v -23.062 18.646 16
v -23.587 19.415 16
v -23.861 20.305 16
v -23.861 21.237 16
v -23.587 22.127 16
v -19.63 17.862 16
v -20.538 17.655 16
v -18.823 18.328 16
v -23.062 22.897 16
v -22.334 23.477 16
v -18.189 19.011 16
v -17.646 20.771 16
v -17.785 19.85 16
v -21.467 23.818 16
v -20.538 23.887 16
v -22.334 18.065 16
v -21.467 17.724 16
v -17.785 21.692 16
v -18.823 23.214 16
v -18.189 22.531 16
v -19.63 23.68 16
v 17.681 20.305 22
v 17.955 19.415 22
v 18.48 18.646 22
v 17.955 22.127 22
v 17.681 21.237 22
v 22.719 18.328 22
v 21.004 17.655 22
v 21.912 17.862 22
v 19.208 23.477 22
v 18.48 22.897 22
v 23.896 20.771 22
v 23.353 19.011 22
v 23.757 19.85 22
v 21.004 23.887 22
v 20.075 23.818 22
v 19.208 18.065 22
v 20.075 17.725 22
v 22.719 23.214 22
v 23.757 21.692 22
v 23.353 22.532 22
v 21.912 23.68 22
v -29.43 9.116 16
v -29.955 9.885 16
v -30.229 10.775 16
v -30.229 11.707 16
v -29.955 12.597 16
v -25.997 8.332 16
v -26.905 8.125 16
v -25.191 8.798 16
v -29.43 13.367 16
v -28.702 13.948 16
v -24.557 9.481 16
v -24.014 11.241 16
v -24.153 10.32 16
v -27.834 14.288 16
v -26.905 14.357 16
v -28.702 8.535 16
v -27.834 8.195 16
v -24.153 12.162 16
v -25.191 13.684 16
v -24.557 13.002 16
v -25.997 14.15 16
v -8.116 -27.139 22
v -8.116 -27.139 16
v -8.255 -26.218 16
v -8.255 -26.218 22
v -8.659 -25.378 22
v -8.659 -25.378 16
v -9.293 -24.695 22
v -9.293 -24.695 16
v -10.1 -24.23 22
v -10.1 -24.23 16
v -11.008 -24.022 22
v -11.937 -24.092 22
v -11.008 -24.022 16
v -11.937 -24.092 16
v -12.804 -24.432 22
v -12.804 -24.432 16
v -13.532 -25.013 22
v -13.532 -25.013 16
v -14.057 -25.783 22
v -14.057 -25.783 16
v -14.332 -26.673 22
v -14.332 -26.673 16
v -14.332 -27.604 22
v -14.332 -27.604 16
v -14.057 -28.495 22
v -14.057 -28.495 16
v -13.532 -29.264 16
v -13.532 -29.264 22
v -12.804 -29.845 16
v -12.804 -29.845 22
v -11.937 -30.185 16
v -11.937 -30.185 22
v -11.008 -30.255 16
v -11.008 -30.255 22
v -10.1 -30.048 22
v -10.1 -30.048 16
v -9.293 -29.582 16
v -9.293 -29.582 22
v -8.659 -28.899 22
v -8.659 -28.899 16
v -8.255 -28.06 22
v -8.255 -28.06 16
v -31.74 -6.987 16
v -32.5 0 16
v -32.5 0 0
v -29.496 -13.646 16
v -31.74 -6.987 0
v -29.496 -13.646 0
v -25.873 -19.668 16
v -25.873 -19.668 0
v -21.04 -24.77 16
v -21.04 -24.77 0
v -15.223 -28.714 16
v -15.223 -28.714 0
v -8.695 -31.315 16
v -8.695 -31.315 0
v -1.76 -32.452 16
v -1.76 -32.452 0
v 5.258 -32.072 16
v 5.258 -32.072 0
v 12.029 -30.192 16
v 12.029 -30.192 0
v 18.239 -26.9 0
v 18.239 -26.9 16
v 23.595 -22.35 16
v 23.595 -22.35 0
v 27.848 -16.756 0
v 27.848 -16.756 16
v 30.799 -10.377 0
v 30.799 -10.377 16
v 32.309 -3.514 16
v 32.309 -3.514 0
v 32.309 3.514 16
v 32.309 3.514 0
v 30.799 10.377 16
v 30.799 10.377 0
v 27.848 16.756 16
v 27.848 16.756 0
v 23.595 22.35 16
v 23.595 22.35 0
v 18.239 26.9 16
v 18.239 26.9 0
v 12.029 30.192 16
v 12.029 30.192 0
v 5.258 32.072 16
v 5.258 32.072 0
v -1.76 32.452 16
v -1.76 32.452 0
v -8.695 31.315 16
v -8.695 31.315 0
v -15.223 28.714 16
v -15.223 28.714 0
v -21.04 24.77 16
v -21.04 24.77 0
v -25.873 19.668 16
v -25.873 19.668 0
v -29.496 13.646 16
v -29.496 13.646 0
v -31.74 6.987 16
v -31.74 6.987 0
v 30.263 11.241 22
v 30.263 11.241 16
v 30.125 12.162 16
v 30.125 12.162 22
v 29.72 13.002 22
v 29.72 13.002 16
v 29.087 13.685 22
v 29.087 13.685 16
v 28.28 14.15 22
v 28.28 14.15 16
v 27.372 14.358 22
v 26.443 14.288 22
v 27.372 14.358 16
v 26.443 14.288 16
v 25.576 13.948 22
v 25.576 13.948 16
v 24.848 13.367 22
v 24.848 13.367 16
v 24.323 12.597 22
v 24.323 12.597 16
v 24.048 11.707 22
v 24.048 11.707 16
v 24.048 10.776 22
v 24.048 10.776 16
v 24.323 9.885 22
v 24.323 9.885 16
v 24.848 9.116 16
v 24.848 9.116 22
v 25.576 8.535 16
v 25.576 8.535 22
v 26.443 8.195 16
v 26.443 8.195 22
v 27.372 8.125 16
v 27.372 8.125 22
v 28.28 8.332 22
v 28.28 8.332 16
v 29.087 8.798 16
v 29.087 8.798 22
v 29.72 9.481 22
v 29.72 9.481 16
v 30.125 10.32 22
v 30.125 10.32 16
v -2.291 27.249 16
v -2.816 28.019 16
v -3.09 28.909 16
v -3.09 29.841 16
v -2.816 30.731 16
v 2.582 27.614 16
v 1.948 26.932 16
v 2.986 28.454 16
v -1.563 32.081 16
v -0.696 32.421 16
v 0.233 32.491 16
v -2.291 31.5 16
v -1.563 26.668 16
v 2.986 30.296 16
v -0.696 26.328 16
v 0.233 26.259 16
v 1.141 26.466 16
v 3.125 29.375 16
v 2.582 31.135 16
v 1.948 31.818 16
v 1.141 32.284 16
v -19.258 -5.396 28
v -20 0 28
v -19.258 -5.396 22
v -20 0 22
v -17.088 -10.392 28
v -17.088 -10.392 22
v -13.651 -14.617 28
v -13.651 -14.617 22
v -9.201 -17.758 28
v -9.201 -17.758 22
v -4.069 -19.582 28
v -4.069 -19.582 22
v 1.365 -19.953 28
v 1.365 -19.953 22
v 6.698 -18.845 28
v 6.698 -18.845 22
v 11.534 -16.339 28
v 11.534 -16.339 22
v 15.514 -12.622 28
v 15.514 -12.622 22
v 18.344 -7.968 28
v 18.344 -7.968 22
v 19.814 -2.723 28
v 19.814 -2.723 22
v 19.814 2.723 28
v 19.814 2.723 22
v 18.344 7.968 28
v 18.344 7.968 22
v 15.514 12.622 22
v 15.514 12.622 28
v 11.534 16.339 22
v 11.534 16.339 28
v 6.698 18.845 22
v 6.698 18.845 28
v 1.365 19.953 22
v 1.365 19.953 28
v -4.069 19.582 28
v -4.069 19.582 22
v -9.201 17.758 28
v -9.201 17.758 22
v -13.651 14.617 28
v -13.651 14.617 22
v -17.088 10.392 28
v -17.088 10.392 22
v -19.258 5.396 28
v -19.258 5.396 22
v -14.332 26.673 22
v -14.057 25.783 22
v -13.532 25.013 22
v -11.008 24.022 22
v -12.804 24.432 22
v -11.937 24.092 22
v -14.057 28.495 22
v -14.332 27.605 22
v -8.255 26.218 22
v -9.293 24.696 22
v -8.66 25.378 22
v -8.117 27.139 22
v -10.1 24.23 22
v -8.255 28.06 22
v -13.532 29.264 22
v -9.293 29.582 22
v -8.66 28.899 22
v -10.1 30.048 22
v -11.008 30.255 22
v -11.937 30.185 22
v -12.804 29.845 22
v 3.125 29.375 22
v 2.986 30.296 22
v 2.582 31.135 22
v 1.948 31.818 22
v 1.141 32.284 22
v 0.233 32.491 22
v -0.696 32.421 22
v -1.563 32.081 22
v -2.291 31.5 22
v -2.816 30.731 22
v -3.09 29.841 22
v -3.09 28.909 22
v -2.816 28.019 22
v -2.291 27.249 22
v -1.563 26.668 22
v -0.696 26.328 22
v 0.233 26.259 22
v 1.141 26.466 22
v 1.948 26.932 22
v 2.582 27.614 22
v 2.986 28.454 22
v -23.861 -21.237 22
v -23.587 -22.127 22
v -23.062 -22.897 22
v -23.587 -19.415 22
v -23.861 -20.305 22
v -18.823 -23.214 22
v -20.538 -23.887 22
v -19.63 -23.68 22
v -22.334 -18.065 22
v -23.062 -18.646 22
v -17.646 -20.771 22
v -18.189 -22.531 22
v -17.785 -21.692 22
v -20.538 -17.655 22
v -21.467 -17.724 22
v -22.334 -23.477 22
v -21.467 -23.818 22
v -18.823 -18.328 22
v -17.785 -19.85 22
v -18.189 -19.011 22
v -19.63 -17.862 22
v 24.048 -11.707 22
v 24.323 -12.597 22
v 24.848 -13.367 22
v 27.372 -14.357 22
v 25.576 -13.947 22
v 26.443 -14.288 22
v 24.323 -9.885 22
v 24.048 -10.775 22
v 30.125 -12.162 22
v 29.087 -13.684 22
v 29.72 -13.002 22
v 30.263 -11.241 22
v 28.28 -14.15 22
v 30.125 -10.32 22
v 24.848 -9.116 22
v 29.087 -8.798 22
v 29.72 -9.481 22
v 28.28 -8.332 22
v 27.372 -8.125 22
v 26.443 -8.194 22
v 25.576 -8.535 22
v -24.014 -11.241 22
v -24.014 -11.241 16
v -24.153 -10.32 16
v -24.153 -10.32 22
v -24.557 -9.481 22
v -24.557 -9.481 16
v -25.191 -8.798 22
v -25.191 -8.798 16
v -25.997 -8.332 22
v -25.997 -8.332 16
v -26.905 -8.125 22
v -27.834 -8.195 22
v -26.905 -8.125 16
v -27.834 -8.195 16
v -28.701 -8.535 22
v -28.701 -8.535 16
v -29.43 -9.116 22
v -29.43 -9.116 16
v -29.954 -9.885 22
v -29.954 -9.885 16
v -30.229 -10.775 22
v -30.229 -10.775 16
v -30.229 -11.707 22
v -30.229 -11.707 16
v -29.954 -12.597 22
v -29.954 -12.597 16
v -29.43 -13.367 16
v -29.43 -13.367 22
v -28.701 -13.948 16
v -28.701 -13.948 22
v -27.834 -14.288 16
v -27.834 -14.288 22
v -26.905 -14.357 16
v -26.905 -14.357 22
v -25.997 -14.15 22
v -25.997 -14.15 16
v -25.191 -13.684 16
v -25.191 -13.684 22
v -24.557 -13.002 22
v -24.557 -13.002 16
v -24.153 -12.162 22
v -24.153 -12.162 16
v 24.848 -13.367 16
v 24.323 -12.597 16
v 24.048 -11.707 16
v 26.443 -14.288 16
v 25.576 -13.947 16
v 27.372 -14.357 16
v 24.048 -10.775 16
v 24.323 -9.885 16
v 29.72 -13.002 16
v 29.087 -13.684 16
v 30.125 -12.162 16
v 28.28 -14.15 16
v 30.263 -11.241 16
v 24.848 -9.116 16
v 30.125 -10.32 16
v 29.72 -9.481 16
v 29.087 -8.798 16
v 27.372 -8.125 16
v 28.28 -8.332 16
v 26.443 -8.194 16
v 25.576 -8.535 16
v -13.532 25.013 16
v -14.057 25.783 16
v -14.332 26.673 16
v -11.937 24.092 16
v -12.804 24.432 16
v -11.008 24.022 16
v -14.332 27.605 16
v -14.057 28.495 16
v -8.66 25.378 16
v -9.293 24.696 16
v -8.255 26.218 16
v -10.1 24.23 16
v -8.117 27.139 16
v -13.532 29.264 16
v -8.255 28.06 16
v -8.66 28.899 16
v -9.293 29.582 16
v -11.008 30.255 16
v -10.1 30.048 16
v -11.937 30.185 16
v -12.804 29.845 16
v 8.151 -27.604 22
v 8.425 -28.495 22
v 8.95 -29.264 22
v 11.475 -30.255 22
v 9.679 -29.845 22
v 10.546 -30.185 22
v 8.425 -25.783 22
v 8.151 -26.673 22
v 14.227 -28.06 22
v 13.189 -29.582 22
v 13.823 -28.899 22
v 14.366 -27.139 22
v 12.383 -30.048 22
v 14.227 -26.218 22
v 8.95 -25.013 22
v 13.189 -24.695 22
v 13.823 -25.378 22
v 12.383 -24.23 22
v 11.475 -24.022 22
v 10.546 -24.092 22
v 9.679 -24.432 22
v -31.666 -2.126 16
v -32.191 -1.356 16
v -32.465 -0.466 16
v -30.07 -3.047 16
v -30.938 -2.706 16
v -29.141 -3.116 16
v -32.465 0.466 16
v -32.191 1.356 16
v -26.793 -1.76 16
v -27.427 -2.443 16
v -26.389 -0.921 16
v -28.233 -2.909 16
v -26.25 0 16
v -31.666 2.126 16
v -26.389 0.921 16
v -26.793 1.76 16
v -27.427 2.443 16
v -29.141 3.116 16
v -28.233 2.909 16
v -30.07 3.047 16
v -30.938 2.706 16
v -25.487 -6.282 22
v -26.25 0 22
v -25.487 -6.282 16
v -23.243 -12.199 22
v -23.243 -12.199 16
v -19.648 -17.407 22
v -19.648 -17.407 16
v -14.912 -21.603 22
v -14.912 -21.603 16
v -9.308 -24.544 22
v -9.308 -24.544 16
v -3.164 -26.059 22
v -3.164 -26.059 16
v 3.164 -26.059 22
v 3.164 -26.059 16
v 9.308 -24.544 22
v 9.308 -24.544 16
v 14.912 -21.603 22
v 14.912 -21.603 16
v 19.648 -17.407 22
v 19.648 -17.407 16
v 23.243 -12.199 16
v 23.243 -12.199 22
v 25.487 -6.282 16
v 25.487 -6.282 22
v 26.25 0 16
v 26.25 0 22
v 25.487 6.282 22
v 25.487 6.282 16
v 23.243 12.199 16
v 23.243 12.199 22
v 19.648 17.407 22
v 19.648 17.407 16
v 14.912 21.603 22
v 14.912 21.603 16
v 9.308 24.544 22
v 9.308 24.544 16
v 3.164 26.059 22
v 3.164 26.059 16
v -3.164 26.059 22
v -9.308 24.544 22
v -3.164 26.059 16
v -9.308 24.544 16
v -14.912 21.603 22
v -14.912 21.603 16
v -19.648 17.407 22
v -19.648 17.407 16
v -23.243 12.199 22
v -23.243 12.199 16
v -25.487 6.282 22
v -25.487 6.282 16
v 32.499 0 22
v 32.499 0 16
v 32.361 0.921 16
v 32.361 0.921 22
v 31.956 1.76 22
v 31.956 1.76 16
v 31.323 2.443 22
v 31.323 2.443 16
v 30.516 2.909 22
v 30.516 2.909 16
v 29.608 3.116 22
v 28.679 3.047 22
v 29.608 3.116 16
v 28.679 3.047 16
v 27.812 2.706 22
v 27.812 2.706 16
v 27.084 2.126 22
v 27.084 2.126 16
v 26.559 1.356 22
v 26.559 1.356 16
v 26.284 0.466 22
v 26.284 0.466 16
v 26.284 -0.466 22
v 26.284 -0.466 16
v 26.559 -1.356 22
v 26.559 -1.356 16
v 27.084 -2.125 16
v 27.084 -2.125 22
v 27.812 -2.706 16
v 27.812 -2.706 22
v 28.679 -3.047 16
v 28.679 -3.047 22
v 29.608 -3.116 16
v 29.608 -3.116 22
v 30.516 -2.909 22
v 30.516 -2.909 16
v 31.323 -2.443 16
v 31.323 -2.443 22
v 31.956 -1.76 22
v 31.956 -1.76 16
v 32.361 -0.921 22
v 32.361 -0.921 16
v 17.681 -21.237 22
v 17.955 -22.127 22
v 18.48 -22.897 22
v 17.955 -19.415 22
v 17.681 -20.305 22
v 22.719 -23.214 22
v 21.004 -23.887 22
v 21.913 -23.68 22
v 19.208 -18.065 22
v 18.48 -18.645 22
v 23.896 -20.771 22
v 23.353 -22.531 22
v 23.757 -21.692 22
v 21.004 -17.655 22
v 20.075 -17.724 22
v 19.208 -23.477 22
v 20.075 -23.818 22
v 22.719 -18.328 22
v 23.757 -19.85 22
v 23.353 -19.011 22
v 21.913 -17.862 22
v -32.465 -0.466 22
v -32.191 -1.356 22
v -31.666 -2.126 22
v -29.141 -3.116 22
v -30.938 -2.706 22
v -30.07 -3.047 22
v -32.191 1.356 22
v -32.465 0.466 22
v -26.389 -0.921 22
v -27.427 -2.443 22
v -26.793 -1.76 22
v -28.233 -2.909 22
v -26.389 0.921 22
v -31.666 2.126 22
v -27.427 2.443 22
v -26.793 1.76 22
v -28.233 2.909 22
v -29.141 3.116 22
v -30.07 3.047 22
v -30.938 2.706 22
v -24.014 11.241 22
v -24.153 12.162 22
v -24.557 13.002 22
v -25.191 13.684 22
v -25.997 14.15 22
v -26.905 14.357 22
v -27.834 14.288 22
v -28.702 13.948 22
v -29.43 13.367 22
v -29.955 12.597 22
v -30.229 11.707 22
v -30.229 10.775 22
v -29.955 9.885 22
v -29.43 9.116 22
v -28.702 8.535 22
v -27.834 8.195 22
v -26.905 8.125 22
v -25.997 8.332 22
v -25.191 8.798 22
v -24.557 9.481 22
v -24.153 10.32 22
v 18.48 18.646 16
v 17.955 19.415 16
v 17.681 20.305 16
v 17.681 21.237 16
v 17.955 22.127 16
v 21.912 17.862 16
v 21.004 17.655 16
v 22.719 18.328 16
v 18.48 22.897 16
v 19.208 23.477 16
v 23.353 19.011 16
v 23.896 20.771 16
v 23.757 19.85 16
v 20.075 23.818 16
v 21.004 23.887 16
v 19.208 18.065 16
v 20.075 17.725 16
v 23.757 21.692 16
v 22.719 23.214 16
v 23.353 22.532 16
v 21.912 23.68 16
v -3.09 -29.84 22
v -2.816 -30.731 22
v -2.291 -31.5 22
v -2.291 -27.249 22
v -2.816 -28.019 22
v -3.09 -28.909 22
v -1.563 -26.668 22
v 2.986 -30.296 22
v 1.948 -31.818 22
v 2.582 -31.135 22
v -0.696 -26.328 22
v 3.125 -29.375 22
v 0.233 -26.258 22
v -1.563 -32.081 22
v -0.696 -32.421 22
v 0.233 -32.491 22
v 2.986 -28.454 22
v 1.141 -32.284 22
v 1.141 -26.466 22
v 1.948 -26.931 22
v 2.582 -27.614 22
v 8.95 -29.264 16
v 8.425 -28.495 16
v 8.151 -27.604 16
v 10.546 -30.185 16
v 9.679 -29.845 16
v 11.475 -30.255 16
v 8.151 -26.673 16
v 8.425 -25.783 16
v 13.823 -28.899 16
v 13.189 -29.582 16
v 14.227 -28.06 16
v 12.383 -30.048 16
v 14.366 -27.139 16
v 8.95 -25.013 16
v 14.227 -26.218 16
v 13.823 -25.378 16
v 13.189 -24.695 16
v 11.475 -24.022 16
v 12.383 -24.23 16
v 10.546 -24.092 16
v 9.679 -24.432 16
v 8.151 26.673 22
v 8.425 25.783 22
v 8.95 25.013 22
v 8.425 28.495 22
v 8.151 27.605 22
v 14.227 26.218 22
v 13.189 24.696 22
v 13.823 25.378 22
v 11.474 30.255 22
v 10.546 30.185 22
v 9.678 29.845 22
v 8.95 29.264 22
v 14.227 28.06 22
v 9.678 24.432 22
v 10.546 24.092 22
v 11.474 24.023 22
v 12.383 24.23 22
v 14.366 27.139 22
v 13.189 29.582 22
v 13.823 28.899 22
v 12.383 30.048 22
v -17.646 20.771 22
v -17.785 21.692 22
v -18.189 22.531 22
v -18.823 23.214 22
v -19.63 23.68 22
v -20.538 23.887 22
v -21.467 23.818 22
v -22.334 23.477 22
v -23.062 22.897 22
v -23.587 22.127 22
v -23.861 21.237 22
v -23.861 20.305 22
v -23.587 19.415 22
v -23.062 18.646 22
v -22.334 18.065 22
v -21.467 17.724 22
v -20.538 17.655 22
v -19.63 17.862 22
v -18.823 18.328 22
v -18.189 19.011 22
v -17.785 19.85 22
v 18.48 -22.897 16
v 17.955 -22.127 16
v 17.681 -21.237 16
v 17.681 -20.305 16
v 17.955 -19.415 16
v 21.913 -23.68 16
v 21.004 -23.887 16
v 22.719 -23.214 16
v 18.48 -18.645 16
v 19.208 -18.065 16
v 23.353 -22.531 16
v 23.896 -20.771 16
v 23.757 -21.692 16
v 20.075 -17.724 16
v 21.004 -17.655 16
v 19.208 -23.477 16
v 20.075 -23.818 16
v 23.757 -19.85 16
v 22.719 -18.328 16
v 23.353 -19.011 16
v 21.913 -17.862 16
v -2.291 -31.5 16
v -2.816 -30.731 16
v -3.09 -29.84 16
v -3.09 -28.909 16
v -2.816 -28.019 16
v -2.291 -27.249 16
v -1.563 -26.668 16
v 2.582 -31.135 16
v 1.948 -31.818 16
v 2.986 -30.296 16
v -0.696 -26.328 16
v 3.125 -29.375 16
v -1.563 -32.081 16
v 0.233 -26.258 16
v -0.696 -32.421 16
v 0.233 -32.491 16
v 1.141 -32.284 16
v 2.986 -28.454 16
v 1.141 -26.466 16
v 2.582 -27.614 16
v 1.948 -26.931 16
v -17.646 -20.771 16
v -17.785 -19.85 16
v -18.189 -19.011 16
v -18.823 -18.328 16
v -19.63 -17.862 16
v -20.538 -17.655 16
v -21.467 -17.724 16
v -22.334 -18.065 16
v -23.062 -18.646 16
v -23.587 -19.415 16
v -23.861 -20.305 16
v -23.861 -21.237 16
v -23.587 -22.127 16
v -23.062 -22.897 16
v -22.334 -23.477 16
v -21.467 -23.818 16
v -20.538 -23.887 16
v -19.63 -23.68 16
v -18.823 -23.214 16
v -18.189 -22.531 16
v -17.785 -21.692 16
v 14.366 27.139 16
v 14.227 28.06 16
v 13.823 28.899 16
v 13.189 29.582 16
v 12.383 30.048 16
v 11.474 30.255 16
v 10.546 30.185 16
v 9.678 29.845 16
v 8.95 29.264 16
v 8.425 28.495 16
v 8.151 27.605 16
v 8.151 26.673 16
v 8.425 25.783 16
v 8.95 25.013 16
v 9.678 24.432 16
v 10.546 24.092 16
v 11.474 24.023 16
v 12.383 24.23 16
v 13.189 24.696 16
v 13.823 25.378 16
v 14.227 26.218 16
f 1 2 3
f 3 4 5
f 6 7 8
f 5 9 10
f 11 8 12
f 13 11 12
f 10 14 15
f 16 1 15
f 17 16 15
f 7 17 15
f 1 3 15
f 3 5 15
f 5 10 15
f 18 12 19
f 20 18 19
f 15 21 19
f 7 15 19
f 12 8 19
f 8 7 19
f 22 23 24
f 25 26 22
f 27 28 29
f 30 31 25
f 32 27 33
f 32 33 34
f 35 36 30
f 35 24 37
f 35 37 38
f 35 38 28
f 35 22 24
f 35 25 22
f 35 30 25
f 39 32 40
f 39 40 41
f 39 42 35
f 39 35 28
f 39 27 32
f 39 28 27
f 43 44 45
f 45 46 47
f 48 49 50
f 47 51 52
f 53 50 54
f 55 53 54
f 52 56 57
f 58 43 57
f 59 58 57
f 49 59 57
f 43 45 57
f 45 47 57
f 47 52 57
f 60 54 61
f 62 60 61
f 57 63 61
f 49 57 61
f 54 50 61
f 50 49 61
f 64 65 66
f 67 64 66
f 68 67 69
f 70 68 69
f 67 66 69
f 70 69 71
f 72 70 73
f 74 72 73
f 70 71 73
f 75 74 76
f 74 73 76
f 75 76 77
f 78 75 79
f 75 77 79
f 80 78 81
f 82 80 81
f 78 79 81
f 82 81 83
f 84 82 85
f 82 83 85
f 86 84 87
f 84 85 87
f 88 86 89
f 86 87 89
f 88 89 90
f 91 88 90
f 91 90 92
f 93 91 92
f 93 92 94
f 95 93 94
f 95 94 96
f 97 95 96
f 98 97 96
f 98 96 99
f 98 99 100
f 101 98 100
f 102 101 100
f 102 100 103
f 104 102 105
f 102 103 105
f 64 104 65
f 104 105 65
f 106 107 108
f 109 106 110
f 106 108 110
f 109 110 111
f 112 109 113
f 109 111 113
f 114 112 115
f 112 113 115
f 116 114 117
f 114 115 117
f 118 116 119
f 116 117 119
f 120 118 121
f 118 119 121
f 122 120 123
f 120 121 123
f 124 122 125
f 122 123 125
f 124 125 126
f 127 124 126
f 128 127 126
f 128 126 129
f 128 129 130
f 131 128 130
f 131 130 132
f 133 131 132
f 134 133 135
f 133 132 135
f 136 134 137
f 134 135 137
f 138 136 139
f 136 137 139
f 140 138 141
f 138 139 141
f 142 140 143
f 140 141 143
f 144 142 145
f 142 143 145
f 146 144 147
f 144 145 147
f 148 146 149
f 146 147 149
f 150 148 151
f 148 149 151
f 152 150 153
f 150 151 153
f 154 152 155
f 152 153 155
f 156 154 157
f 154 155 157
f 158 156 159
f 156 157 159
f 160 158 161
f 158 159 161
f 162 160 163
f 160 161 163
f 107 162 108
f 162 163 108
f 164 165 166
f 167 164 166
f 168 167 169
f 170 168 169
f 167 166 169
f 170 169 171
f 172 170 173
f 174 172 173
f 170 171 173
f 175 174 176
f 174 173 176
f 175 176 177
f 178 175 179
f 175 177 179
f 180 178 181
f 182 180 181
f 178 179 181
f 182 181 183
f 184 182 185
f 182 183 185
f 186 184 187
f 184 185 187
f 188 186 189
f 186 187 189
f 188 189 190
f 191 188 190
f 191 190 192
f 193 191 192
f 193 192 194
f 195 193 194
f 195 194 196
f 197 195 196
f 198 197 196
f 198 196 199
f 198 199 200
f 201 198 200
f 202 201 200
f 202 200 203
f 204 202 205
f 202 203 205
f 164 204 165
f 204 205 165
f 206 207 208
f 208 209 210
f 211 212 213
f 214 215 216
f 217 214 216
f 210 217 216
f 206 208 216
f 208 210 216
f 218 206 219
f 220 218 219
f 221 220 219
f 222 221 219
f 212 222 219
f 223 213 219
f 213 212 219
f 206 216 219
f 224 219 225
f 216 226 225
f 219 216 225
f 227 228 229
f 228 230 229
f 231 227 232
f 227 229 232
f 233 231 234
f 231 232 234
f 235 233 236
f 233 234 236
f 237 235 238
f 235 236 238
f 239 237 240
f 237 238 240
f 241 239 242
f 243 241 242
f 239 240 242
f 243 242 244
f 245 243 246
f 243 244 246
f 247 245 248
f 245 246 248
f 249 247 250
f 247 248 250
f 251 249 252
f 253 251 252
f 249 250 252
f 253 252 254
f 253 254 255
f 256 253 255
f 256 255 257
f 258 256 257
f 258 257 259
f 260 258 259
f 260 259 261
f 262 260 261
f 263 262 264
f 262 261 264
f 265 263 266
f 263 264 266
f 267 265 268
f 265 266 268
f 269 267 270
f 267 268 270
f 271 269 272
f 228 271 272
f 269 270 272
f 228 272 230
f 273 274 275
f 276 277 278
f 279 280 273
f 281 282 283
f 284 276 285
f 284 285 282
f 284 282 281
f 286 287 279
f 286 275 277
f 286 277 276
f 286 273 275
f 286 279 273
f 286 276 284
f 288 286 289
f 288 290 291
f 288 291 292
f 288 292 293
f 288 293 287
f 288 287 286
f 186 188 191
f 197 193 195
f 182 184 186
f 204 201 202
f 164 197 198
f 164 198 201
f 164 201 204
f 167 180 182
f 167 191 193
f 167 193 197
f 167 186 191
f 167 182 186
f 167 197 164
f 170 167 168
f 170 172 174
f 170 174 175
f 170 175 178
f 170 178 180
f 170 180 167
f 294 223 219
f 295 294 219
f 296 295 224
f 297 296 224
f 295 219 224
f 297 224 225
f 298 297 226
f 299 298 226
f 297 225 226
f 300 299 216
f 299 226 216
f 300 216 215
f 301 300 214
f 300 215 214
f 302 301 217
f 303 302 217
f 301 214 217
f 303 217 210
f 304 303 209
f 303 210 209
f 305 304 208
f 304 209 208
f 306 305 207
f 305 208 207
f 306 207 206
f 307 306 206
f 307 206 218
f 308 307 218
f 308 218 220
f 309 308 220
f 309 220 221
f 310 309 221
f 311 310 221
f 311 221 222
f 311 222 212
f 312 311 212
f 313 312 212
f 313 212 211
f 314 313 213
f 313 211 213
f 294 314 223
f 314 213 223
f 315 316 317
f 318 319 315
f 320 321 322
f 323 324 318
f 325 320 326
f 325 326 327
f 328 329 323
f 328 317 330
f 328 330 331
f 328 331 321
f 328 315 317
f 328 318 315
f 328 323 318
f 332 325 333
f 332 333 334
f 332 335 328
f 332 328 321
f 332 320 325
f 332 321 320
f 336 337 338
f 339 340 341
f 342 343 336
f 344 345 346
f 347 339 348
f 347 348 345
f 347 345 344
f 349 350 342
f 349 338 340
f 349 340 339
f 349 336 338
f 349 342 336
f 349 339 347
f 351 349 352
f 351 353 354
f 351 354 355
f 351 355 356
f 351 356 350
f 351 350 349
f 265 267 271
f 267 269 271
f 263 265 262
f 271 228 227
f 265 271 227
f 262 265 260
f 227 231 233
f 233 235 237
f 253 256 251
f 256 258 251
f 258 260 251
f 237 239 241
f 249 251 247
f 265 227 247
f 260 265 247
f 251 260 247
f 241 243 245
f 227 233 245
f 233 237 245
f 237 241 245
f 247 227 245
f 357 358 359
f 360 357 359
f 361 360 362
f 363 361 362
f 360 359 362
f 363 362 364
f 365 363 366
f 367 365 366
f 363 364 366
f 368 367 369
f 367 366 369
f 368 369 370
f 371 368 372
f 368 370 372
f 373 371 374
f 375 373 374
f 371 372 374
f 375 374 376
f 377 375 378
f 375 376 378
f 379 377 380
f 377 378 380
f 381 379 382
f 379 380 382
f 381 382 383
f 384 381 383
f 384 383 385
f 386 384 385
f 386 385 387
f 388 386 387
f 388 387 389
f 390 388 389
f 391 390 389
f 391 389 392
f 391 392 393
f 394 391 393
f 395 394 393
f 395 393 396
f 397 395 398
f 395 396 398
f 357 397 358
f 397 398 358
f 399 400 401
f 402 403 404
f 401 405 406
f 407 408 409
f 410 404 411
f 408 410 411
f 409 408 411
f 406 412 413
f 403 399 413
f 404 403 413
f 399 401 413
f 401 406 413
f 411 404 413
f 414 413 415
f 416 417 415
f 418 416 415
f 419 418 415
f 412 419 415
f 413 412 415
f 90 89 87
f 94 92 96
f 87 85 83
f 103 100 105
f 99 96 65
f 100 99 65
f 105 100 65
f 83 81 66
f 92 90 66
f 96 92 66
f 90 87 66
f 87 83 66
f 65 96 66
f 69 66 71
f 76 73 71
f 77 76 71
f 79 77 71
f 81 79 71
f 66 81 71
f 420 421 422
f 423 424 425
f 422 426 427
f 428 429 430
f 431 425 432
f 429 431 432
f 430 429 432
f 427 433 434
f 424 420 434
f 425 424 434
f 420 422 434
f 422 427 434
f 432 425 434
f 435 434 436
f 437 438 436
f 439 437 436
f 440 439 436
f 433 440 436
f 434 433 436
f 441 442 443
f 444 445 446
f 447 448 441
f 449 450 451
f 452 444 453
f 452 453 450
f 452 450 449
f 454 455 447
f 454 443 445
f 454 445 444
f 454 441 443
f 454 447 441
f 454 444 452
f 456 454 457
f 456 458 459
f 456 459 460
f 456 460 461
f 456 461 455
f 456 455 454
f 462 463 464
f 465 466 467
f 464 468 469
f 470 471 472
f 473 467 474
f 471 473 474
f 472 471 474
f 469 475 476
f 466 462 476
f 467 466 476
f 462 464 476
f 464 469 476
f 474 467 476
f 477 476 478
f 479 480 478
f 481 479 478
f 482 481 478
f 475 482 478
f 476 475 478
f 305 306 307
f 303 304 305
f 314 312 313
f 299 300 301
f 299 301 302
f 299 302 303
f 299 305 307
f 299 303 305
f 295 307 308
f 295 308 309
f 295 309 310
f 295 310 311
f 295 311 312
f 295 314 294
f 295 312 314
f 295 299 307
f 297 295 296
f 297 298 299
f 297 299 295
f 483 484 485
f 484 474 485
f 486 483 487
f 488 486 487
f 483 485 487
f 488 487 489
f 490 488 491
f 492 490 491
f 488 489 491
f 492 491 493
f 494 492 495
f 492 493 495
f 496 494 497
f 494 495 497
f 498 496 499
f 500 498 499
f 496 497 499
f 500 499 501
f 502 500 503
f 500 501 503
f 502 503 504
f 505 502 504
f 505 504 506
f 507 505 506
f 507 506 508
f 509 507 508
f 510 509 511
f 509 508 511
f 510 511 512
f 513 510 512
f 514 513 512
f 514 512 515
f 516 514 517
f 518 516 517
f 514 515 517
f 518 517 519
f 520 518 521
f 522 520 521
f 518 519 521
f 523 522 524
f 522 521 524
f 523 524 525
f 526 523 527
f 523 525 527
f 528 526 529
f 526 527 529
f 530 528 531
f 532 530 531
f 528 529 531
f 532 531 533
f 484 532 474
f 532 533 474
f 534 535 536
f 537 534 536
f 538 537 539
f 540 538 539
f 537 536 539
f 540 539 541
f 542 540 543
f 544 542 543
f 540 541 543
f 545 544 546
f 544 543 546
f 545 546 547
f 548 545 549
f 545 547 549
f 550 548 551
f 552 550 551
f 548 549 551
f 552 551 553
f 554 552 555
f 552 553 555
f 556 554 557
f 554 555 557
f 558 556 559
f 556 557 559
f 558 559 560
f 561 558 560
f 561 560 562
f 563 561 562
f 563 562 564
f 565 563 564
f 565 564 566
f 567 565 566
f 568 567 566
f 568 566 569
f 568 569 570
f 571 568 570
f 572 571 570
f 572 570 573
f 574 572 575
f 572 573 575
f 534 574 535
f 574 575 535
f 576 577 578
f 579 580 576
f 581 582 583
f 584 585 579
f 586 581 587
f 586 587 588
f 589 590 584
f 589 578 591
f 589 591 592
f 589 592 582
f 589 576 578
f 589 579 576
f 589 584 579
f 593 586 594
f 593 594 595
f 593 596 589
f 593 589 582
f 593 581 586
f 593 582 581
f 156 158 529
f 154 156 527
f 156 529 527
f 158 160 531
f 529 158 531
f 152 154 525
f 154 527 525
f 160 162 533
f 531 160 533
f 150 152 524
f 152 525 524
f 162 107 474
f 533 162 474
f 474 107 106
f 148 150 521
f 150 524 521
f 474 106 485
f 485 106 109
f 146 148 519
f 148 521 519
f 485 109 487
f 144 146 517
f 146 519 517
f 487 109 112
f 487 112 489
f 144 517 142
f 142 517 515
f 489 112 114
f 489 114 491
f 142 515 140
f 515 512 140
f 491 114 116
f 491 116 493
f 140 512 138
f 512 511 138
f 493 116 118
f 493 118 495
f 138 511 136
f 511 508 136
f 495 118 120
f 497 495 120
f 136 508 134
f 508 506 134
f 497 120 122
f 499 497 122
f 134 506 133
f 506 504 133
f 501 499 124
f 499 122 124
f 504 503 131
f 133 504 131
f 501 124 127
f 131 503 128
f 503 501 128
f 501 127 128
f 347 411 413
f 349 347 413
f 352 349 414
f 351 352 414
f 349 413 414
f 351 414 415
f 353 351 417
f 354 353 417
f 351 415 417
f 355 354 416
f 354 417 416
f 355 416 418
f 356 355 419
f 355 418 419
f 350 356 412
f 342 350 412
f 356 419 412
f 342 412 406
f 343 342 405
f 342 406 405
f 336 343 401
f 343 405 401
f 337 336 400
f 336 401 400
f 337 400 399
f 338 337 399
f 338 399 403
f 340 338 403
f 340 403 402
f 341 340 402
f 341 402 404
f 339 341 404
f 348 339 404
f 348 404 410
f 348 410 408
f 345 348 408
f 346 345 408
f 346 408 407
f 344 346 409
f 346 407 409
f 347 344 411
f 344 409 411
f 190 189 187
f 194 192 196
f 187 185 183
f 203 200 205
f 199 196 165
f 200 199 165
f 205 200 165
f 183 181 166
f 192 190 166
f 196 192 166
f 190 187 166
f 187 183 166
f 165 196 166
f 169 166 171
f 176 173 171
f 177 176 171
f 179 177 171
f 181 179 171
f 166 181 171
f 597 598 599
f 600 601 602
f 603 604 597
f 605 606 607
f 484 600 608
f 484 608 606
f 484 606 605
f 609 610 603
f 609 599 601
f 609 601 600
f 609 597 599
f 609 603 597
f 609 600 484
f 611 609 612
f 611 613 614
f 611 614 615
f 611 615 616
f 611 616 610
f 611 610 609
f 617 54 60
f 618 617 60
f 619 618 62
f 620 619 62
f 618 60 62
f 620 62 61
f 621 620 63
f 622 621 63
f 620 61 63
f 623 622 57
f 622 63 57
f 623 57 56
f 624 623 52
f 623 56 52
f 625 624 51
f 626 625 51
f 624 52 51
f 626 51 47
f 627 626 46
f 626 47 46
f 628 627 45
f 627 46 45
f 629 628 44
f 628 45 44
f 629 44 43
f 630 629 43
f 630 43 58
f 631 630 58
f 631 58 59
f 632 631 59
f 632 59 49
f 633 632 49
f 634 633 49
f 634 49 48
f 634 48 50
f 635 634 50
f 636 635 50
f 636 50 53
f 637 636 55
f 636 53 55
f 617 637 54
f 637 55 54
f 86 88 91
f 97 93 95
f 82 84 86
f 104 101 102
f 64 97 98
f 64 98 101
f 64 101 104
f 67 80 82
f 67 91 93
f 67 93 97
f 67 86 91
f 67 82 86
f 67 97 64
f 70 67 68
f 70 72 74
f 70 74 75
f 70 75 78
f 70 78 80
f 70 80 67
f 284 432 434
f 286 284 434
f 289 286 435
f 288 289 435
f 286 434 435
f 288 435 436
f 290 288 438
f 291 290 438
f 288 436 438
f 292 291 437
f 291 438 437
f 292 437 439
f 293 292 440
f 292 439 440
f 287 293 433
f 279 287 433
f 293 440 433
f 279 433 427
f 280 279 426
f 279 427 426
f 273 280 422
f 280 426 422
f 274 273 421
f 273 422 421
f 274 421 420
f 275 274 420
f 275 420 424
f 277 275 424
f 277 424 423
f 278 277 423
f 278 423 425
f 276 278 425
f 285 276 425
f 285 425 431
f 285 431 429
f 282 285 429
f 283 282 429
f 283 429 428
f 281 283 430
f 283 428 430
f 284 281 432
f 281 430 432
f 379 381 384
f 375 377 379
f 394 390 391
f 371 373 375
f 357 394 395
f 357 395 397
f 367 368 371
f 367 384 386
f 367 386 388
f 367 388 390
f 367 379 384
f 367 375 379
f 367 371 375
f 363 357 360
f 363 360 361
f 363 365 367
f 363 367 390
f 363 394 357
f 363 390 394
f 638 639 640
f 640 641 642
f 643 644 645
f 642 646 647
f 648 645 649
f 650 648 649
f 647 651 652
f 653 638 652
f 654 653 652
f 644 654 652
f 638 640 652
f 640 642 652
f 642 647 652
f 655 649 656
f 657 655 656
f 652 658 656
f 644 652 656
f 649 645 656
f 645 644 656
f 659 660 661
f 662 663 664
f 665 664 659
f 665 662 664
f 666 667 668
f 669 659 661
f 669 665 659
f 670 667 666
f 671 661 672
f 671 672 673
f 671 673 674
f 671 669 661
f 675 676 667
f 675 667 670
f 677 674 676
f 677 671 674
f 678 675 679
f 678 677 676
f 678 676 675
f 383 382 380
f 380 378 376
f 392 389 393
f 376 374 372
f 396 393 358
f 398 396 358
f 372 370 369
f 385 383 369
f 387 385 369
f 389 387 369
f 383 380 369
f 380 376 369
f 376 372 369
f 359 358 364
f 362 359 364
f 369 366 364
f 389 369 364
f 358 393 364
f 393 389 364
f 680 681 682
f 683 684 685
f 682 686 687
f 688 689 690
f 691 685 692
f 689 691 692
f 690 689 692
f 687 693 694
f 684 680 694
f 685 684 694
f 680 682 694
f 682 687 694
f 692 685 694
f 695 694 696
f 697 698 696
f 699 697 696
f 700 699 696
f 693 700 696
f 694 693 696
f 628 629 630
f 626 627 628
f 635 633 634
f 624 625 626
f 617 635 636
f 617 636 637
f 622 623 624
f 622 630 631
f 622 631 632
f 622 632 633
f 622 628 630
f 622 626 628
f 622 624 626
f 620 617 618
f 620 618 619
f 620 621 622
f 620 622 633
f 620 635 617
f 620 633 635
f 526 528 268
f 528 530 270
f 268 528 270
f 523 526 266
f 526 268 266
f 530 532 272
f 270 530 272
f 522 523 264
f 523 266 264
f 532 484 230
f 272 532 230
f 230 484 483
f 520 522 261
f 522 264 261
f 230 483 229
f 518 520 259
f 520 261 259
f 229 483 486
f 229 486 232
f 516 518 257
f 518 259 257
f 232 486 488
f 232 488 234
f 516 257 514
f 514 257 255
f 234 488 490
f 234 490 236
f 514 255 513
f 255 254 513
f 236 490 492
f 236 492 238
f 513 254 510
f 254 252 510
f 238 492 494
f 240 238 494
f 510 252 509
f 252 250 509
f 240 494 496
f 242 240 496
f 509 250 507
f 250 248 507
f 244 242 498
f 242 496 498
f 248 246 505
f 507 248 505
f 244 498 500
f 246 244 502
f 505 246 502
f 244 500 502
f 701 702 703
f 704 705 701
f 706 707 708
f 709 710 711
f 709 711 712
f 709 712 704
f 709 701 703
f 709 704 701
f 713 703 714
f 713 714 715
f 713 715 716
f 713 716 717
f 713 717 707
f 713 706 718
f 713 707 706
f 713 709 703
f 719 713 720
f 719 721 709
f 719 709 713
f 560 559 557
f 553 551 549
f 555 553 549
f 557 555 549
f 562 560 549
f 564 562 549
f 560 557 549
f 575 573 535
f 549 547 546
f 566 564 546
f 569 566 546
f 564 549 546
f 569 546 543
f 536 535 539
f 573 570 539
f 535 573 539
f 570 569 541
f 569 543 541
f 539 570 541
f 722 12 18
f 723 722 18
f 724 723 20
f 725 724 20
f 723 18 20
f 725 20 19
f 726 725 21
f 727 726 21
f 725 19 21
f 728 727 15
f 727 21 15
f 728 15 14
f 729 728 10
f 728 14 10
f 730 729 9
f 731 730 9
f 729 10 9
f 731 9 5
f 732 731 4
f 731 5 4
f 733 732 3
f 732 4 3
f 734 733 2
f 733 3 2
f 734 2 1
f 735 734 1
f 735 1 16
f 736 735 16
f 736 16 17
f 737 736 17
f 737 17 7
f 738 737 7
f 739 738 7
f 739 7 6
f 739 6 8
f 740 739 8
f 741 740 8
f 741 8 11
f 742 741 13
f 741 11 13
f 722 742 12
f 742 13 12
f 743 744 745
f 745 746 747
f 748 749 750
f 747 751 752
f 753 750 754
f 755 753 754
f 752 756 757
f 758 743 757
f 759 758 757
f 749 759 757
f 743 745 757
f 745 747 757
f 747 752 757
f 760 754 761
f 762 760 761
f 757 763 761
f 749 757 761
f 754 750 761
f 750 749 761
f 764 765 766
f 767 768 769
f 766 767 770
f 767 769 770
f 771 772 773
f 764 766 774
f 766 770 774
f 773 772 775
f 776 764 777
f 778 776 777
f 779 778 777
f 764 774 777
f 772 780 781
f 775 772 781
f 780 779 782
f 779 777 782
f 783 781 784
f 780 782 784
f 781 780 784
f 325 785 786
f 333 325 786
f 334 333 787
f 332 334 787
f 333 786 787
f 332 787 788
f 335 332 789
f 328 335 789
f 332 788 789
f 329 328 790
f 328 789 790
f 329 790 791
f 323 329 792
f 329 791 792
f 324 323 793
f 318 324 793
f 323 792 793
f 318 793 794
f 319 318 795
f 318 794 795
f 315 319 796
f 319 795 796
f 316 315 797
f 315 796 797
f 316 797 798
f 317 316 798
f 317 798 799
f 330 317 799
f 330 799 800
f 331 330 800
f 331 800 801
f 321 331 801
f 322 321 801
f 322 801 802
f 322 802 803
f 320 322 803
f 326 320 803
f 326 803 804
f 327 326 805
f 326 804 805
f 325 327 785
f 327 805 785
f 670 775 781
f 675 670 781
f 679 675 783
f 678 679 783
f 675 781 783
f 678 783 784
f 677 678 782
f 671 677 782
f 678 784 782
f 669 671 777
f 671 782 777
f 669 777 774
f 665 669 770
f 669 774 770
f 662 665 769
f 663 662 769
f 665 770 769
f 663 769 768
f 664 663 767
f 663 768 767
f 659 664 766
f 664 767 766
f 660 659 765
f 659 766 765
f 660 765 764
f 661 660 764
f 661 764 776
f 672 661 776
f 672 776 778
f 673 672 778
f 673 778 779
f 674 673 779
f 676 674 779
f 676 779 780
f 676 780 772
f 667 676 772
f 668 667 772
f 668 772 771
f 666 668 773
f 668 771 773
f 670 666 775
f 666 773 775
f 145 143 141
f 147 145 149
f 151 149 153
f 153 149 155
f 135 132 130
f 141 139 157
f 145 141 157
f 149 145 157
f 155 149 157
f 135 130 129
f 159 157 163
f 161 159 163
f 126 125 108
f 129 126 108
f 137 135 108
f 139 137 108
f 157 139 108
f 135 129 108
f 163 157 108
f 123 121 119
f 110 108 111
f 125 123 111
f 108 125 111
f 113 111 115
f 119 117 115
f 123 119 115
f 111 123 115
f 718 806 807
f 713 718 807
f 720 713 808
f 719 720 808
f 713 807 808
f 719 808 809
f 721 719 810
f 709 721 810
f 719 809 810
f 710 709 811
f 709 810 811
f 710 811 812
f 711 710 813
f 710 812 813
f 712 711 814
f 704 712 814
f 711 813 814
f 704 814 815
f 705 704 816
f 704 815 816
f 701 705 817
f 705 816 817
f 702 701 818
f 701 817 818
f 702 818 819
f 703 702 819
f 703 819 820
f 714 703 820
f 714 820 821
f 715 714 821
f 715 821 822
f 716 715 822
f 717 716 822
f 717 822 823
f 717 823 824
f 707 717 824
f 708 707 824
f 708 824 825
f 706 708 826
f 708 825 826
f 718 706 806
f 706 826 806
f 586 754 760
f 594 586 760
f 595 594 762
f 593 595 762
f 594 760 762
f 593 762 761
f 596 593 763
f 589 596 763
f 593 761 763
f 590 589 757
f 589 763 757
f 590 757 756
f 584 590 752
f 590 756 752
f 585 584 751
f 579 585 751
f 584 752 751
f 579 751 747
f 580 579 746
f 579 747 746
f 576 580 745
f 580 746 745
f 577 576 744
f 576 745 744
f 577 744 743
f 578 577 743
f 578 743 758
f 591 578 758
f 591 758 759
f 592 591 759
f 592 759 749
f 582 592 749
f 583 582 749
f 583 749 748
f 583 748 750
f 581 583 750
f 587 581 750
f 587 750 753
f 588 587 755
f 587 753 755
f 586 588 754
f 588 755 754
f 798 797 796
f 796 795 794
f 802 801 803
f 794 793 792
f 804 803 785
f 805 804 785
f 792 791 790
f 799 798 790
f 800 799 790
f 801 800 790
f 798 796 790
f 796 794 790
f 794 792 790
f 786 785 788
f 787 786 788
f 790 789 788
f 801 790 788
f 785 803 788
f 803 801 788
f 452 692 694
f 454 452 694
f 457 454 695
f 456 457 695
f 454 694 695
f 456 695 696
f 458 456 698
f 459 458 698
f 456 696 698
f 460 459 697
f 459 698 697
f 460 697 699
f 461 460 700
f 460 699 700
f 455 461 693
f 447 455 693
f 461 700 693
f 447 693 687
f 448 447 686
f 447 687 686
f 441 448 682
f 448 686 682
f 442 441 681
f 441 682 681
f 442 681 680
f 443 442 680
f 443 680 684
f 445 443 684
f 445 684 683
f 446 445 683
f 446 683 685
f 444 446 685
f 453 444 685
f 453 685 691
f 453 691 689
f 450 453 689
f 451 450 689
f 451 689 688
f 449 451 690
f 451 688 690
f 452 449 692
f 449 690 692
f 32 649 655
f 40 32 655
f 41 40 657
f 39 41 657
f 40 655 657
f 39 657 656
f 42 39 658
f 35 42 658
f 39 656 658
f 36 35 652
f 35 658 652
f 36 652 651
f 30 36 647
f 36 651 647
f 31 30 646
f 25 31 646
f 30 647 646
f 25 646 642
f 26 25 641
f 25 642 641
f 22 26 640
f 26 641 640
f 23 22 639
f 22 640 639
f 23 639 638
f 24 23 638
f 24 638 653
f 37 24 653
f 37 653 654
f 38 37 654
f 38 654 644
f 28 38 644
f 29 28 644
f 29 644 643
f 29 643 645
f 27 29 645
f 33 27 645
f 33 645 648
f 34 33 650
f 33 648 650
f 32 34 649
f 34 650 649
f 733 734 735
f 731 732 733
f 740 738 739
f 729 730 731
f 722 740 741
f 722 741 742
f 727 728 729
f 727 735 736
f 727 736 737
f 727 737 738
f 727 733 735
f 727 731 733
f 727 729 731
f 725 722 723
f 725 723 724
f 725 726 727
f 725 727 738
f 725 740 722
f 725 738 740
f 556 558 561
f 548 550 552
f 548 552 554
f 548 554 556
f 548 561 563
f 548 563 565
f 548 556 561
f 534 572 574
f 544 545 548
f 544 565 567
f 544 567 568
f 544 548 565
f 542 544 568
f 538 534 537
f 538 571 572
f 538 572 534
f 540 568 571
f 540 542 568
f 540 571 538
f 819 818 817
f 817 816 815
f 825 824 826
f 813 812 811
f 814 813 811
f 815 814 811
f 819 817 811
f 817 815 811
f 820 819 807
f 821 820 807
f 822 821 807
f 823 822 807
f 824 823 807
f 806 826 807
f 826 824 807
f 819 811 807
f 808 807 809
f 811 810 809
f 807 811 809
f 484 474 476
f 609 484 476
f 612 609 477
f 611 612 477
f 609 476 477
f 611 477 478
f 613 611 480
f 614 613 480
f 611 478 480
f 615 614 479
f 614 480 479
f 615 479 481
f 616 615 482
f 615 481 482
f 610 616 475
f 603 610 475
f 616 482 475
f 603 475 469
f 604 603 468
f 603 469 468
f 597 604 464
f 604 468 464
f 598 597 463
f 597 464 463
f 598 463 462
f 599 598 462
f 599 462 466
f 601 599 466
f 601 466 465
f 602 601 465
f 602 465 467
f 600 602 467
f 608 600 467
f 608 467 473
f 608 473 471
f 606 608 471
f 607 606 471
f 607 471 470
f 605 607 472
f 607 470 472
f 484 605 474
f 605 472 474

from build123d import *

# Parameters (mm, degrees)
SCHIZZO1_W                   = 20
SCHIZZO1_H                   = 6
SCHIZZO2_R                   = 3.125
AGGANCIWELDINGTORCH_DEPTH    = 6
AGGANCIWELDINGTORCH_2_DEPTH  = 6
AGGANCIWELDINGTORCH_3_DEPTH  = 6
AGGANCIWELDINGTORCH_4_DEPTH  = 6
AGGANCIWELDINGTORCH_5_DEPTH  = 6
AGGANCIWELDINGTORCH_6_DEPTH  = 6
AGGANCIWELDINGTORCH_7_DEPTH  = 6
AGGANCIWELDINGTORCH_8_DEPTH  = 6
AGGANCIWELDINGTORCH_9_DEPTH  = 6
AGGANCIWELDINGTORCH_10_DEPTH = 6
AGGANCIWELDINGTORCH_11_DEPTH = 6
AGGANCIWELDINGTORCH_12_DEPTH = 6
AGGANCIWELDINGTORCH_13_DEPTH = 6
AGGANCIWELDINGTORCH_14_DEPTH = 6
AGGANCIWELDINGTORCH_15_DEPTH = 6
AGGANCIWELDINGTORCH_16_DEPTH = 6


with BuildPart() as part:
    # Schizzo1 → Rivoluzione1 (revolve)
    with BuildSketch(Plane(origin=(0, 0, 0), x_dir=(1, 0, 0), z_dir=(0, 1, 0)), mode=Mode.PRIVATE) as rivoluzione1_sk:
        Polygon((32.5, 0), (0, 0), (0, -16), (26.25, -16), (32.5, -16), align=None)
        Polygon((26.25, -16), (0, -16), (0, -22), (20, -22), (26.25, -22), align=None)
        with Locations((10, -25)):
            Rectangle(SCHIZZO1_W, SCHIZZO1_H)
    revolve(rivoluzione1_sk.sketch.rotate(Axis((0, 0, -26.831100571), (0, 0, 1)), 180), axis=Axis((0, 0, -26.831100571), (0, 0, 1)))


with BuildPart() as body_2:
    # Schizzo2 → AgganciWeldingTorch (new body)
    with BuildSketch(Plane.XY.offset(16)):
        with Locations((-29.375, 0)):
            Circle(SCHIZZO2_R)
    extrude(amount=AGGANCIWELDINGTORCH_DEPTH)


with BuildPart() as body_3:
    # Schizzo2 → AgganciWeldingTorch 2 (new body)
    with BuildSketch(Plane.XY.offset(16)):
        with Locations((-27.139001091, 11.241229683)):
            Circle(SCHIZZO2_R)
    extrude(amount=AGGANCIWELDINGTORCH_2_DEPTH)


with BuildPart() as body_4:
    # Schizzo2 → AgganciWeldingTorch 3 (new body)
    with BuildSketch(Plane.XY.offset(16)):
        with Locations((-20.771375105, 20.77109197)):
            Circle(SCHIZZO2_R)
    extrude(amount=AGGANCIWELDINGTORCH_3_DEPTH)


with BuildPart() as body_5:
    # Schizzo2 → AgganciWeldingTorch 4 (new body)
    with BuildSketch(Plane.XY.offset(16)):
        with Locations((-11.241535377, 27.138751716)):
            Circle(SCHIZZO2_R)
    extrude(amount=AGGANCIWELDINGTORCH_4_DEPTH)


with BuildPart() as body_6:
    # Schizzo2 → AgganciWeldingTorch 5 (new body)
    with BuildSketch(Plane.XY.offset(16)):
        with Locations((-0.000313615, 29.374790448)):
            Circle(SCHIZZO2_R)
    extrude(amount=AGGANCIWELDINGTORCH_5_DEPTH)


with BuildPart() as body_7:
    # Schizzo2 → AgganciWeldingTorch 6 (new body)
    with BuildSketch(Plane.XY.offset(16)):
        with Locations((11.240916068, 27.138791539)):
            Circle(SCHIZZO2_R)
    extrude(amount=AGGANCIWELDINGTORCH_6_DEPTH)


with BuildPart() as body_8:
    # Schizzo2 → AgganciWeldingTorch 7 (new body)
    with BuildSketch(Plane.XY.offset(16)):
        with Locations((20.770778355, 20.771165554)):
            Circle(SCHIZZO2_R)
    extrude(amount=AGGANCIWELDINGTORCH_7_DEPTH)


with BuildPart() as body_9:
    # Schizzo2 → AgganciWeldingTorch 8 (new body)
    with BuildSketch(Plane.XY.offset(16)):
        with Locations((27.138438101, 11.241325825)):
            Circle(SCHIZZO2_R)
    extrude(amount=AGGANCIWELDINGTORCH_8_DEPTH)


with BuildPart() as body_10:
    # Schizzo2 → AgganciWeldingTorch 9 (new body)
    with BuildSketch(Plane.XY.offset(16)):
        with Locations((29.374476833, 0.000104063)):
            Circle(SCHIZZO2_R)
    extrude(amount=AGGANCIWELDINGTORCH_9_DEPTH)


with BuildPart() as body_11:
    # Schizzo2 → AgganciWeldingTorch 10 (new body)
    with BuildSketch(Plane.XY.offset(16)):
        with Locations((27.138477924, -11.241125619)):
            Circle(SCHIZZO2_R)
    extrude(amount=AGGANCIWELDINGTORCH_10_DEPTH)


with BuildPart() as body_12:
    # Schizzo2 → AgganciWeldingTorch 11 (new body)
    with BuildSketch(Plane.XY.offset(16)):
        with Locations((20.770851939, -20.770987906)):
            Circle(SCHIZZO2_R)
    extrude(amount=AGGANCIWELDINGTORCH_11_DEPTH)


with BuildPart() as body_13:
    # Schizzo2 → AgganciWeldingTorch 12 (new body)
    with BuildSketch(Plane.XY.offset(16)):
        with Locations((11.24101221, -27.138647653)):
            Circle(SCHIZZO2_R)
    extrude(amount=AGGANCIWELDINGTORCH_12_DEPTH)


with BuildPart() as body_14:
    # Schizzo2 → AgganciWeldingTorch 13 (new body)
    with BuildSketch(Plane.XY.offset(16)):
        with Locations((-0.000209552, -29.374686385)):
            Circle(SCHIZZO2_R)
    extrude(amount=AGGANCIWELDINGTORCH_13_DEPTH)


with BuildPart() as body_15:
    # Schizzo2 → AgganciWeldingTorch 14 (new body)
    with BuildSketch(Plane.XY.offset(16)):
        with Locations((-11.241439234, -27.138687476)):
            Circle(SCHIZZO2_R)
    extrude(amount=AGGANCIWELDINGTORCH_14_DEPTH)


with BuildPart() as body_16:
    # Schizzo2 → AgganciWeldingTorch 15 (new body)
    with BuildSketch(Plane.XY.offset(16)):
        with Locations((-20.771301521, -20.77106149)):
            Circle(SCHIZZO2_R)
    extrude(amount=AGGANCIWELDINGTORCH_15_DEPTH)


with BuildPart() as body_17:
    # Schizzo2 → AgganciWeldingTorch 16 (new body)
    with BuildSketch(Plane.XY.offset(16)):
        with Locations((-27.138961268, -11.241221761)):
            Circle(SCHIZZO2_R)
    extrude(amount=AGGANCIWELDINGTORCH_16_DEPTH)


solid = Compound([part.part, body_2.part, body_3.part, body_4.part, body_5.part, body_6.part, body_7.part, body_8.part, body_9.part, body_10.part, body_11.part, body_12.part, body_13.part, body_14.part, body_15.part, body_16.part, body_17.part])
